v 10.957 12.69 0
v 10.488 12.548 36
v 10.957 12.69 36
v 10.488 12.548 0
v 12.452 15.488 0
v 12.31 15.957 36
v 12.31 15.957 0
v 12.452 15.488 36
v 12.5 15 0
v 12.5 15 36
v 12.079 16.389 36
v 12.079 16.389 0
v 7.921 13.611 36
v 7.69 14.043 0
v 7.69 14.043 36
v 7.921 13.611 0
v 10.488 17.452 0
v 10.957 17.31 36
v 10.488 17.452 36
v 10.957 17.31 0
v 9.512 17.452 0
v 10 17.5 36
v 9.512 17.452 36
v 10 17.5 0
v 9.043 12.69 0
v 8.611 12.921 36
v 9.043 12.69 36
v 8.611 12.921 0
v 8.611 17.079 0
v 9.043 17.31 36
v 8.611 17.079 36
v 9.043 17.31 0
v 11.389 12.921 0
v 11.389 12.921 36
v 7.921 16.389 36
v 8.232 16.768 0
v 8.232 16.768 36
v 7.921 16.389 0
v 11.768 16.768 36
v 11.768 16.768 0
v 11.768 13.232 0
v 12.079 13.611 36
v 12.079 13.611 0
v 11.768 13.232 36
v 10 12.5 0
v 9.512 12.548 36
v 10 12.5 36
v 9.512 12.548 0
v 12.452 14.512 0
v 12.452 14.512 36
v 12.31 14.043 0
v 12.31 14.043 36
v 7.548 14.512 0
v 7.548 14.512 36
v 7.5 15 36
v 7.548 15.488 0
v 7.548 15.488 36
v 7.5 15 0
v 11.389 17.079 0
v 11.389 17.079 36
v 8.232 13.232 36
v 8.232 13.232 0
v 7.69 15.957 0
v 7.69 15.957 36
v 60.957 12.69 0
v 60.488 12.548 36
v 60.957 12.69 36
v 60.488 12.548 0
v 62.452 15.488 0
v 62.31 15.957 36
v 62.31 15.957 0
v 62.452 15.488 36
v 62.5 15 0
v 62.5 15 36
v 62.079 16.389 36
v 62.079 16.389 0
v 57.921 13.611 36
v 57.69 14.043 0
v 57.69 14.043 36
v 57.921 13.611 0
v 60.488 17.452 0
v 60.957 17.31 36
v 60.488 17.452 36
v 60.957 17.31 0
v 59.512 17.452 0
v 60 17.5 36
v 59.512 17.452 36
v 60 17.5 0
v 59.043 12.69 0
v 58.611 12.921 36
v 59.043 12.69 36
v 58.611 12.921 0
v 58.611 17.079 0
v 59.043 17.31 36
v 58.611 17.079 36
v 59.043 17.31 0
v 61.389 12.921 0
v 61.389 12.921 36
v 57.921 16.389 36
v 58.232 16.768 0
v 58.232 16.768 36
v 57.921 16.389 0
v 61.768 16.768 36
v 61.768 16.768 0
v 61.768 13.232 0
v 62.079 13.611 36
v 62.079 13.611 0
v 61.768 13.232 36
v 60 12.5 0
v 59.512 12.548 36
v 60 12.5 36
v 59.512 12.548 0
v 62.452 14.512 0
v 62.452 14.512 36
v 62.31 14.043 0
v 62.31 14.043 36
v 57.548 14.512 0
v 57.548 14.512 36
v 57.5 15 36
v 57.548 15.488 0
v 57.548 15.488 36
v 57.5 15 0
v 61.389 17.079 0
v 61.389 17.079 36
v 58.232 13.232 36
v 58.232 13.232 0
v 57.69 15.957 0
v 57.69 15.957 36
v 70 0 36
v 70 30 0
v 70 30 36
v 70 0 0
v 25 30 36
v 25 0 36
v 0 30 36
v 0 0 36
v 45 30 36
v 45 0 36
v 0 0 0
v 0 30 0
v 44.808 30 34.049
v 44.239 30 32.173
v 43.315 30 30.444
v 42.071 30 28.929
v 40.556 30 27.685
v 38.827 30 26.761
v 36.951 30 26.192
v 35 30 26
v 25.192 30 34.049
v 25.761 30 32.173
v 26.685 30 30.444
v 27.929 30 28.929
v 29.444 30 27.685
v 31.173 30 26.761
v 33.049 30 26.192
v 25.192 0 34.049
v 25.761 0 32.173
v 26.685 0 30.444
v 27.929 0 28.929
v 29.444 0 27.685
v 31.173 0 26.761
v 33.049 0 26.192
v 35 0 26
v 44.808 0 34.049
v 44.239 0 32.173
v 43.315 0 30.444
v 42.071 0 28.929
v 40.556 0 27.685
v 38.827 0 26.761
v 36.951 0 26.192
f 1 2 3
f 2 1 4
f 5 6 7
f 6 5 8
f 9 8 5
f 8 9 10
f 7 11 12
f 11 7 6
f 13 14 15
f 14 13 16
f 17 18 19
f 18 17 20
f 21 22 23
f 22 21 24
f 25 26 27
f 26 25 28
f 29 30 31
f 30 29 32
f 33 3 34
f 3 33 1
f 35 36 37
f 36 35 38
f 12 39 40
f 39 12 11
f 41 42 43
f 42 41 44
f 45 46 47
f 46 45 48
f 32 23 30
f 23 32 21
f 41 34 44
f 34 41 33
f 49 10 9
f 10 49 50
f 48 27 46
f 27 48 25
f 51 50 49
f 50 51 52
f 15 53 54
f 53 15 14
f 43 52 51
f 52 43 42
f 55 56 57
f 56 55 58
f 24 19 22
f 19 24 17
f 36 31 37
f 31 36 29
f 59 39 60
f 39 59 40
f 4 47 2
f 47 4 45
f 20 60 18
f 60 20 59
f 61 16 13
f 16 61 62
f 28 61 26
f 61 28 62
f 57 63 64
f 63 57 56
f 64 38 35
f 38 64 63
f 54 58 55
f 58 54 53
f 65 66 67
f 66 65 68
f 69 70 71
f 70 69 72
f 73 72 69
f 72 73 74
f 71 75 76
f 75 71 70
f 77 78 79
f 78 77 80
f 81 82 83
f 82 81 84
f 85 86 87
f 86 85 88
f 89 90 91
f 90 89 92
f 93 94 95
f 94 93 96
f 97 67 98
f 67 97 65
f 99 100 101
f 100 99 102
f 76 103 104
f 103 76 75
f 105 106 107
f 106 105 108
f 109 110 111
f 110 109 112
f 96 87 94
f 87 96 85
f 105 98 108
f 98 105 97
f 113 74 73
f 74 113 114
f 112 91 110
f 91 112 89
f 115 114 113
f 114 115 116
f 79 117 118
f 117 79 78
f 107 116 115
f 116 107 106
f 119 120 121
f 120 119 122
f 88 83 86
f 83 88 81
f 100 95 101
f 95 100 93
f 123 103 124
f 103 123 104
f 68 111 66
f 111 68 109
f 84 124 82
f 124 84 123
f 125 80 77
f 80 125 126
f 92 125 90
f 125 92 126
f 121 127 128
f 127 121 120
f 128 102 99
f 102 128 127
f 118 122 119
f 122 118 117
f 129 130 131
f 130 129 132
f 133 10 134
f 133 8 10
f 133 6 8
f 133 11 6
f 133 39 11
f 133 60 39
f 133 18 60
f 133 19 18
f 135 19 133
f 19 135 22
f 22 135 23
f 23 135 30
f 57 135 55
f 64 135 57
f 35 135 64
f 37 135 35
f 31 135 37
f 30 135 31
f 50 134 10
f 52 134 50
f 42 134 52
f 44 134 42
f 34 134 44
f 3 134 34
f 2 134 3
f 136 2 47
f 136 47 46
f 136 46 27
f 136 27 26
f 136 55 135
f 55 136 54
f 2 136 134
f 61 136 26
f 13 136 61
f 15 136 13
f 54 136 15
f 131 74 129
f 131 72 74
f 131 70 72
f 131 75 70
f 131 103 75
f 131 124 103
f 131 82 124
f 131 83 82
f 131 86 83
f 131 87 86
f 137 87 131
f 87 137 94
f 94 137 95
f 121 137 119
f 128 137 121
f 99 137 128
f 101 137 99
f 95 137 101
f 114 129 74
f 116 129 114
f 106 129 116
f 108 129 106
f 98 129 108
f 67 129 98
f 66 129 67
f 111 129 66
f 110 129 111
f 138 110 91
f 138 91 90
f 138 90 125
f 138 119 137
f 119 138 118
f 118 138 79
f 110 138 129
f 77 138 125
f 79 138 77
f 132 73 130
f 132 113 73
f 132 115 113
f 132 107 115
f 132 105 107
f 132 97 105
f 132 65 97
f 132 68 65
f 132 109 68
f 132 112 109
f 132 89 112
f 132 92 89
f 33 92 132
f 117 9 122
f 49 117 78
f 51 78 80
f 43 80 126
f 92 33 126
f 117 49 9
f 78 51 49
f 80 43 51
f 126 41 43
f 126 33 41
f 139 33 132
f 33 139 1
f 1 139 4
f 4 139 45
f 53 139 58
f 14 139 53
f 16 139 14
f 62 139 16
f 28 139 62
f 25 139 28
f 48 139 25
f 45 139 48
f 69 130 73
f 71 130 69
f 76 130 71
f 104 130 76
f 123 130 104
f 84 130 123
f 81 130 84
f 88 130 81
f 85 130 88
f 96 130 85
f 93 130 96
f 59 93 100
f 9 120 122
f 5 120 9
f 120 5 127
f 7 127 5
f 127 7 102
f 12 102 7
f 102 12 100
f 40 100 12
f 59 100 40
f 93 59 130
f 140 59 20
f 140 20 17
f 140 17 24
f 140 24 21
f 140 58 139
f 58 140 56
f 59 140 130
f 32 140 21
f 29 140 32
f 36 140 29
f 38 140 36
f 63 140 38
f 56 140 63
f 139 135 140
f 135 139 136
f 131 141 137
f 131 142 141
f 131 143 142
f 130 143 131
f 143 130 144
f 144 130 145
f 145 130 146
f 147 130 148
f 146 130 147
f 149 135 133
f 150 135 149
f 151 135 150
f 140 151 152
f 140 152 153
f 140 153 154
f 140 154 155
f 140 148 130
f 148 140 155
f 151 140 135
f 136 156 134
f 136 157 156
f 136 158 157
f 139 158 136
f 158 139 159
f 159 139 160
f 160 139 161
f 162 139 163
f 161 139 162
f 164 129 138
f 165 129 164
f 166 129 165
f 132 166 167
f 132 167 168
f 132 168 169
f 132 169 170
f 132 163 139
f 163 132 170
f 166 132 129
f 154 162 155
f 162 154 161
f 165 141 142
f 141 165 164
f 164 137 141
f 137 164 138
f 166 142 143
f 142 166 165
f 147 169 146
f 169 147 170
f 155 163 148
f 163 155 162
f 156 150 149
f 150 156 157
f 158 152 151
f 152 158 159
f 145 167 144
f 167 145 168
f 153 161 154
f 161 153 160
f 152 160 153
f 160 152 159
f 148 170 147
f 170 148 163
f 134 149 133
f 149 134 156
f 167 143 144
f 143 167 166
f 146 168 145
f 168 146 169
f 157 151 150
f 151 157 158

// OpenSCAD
$fn = 32;

// ----------------------------------------------------------------------
// Saddle clamp: plain shaft clamp
// ----------------------------------------------------------------------

// --- parameters (mm) ---
blk_l = 70;               // block length, X
blk_w = 30;               // block width, Y
blk_h = 36;               // block height
clamp_r = 10;             // shaft groove radius
hole_r = 2.5;             // bolt hole radius
hole_m = 10;              // bolt hole margin from the ends

saw_depth = clamp_r + 3;  // saw kerf depth

difference() {
  cube([blk_l, blk_w, blk_h]);
  translate([blk_l / 2, -1, blk_h])
    rotate([-90, 0, 0])
      cylinder(h = blk_w + 2, r = clamp_r);
  for (sx = [0, 1])
    translate([sx ? blk_l - hole_m : hole_m, blk_w / 2, -1])
      cylinder(r = hole_r, h = blk_h + 2);
}
